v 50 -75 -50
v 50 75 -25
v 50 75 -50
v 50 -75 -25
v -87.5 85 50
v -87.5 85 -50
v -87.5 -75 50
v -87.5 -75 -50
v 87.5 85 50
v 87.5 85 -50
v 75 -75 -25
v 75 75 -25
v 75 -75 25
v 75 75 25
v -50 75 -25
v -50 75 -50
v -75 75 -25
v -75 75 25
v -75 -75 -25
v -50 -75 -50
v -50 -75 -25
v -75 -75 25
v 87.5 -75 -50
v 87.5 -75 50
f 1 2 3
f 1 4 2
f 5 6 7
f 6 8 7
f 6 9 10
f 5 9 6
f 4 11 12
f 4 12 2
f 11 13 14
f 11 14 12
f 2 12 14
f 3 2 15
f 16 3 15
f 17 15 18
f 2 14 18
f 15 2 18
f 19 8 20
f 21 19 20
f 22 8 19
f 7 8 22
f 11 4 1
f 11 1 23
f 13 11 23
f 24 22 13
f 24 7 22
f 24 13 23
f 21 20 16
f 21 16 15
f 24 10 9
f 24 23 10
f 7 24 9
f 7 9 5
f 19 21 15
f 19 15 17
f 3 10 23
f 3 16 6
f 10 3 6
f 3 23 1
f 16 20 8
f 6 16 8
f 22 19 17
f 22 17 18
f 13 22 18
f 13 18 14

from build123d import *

# Parameters (mm, degrees)
F1_DEPTH      = 75
F1_DEPTH_BACK = 75
F2_W          = 175
F2_H          = 100
F3_DEPTH      = 10


with BuildPart() as f1:
    # F0 (on Front) → F1 (new body, two sides)
    with BuildSketch(Plane.XZ) as f1_sk:
        Polygon((87.5, -50), (87.5, 50), (-87.5, 50), (-87.5, -50), (-50, -50), (-50, -25), (-75, -25), (-75, 25), (75, 25), (75, -25), (50, -25), (50, -50), align=None)
    extrude(amount=F1_DEPTH)
    extrude(f1_sk.sketch, amount=-F1_DEPTH_BACK)

    # F2 (on face) → F3 (join)
    with BuildSketch(Plane(origin=(0, 75, 0), x_dir=(-1, 0, 0), z_dir=(0, 1, 0))):
        Rectangle(F2_W, F2_H)
    extrude(amount=F3_DEPTH)


solid = f1.part
